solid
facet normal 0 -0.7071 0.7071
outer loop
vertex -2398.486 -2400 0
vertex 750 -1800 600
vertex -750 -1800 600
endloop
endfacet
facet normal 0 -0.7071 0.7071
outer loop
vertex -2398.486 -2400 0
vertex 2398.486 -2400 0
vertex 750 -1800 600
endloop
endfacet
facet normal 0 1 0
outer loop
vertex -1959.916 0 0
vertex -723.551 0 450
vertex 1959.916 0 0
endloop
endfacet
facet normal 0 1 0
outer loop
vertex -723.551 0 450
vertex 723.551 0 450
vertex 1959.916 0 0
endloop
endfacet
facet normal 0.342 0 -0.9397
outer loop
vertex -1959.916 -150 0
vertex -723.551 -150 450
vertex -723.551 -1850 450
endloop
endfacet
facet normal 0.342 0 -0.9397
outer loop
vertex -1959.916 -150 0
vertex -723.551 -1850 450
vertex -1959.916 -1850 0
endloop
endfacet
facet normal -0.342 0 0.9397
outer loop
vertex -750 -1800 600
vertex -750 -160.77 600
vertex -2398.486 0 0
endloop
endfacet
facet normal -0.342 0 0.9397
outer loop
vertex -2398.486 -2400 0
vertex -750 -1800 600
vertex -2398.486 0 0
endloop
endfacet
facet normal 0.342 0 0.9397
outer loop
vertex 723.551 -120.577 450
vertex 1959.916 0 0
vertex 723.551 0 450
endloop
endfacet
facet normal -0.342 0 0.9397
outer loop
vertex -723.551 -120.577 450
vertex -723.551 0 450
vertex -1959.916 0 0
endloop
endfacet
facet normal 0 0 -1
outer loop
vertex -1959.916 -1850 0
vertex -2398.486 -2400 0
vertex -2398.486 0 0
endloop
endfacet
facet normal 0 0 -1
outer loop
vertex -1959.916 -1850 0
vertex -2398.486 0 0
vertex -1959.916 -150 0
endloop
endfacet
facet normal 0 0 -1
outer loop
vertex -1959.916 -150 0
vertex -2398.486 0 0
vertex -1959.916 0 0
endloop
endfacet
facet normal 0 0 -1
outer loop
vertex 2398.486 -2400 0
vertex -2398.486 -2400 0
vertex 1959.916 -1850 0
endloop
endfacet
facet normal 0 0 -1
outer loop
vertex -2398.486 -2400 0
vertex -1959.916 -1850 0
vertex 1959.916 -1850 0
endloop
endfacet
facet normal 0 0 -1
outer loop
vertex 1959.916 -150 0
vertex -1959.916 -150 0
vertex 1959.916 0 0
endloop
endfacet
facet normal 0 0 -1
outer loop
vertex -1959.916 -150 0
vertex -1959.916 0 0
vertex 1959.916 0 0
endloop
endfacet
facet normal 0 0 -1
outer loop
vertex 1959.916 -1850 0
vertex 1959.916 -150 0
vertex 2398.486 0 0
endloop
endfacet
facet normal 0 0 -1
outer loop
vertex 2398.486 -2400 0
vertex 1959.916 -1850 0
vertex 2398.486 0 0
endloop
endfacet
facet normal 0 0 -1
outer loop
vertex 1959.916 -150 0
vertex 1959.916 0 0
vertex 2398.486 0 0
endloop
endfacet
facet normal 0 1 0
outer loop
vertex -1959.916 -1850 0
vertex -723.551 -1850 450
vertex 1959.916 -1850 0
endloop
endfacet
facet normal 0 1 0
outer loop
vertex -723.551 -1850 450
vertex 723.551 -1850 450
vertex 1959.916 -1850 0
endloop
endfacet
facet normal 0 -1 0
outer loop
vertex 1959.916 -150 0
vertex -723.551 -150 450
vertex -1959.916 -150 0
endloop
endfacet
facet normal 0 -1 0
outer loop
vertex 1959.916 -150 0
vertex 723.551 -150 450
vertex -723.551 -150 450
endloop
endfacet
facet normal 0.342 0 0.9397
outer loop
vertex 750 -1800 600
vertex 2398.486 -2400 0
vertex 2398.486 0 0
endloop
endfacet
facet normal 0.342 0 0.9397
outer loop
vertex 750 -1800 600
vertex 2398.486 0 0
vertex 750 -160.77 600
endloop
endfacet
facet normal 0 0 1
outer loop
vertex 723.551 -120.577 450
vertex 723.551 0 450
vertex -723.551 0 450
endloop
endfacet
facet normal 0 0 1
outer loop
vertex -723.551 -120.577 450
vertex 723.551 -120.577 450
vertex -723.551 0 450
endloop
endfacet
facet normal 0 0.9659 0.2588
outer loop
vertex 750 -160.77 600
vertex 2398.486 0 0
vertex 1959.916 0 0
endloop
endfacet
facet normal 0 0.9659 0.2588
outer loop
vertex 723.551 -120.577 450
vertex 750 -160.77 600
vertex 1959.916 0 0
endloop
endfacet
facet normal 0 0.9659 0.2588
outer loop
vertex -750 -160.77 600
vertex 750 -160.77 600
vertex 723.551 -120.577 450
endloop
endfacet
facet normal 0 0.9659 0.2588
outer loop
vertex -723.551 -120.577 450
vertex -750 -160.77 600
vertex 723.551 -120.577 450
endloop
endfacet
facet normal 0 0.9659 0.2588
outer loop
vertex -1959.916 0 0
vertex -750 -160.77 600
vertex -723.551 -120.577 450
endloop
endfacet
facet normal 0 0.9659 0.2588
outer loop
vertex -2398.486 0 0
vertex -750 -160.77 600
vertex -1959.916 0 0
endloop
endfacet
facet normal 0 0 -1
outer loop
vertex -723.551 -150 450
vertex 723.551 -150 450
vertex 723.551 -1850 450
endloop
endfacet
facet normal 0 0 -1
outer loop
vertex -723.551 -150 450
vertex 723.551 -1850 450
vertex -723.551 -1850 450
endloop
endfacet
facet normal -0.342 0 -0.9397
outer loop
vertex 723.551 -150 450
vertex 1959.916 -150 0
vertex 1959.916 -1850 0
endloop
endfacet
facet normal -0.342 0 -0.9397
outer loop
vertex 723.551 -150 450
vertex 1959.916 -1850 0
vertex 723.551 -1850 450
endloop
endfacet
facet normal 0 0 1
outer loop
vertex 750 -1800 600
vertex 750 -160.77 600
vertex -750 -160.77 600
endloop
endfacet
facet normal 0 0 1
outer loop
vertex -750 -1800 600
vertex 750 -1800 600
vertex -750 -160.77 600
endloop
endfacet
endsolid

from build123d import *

# Parameters (mm, degrees)
F1_DEPTH      = 2400
F3_DEPTH      = 2398.4874516728
F3_DEPTH_BACK = 2398.4874516728
F4_DEPTH      = 25
F4_DEPTH_BACK = 1850
F5_DEPTH      = 150


with BuildPart() as f1:
    # F0 (on Front) → F1 (new body)
    with BuildSketch(Plane.XZ):
        Polygon((-723.5509528937, 450), (-1959.9157916483, 0), (1959.9157916483, 0), (723.5509528937, 450), align=None)
        Polygon((-750, 600), (-2398.4864516728, 0), (-1959.9157916483, 0), (-723.5509528937, 450), (723.5509528937, 450), (1959.9157916483, 0), (2398.4864516728, 0), (1574.2432258364, 300), (750, 600), align=None)
    extrude(amount=F1_DEPTH)

    # F2 (on Right) → F3 (cut, two sides)
    with BuildSketch(Plane.YZ) as f3_sk:
        Polygon((-2400, 600), (-2400, 0), (-1800, 600), align=None)
        Polygon((-160.7695154587, 600), (0, 0), (0, 600), align=None)
    extrude(amount=F3_DEPTH, mode=Mode.SUBTRACT)
    extrude(f3_sk.sketch, amount=-F3_DEPTH_BACK, mode=Mode.SUBTRACT)

    # F0 (on Front) → F4 (cut, two sides)
    with BuildSketch(Plane.XZ) as f4_sk:
        Polygon((-723.5509528937, 450), (-1959.9157916483, 0), (1959.9157916483, 0), (723.5509528937, 450), align=None)
    extrude(amount=-F4_DEPTH, mode=Mode.SUBTRACT)
    extrude(f4_sk.sketch, amount=F4_DEPTH_BACK, mode=Mode.SUBTRACT)

    # F0 (on Front) → F5 (join)
    with BuildSketch(Plane.XZ):
        Polygon((-723.5509528937, 450), (-1959.9157916483, 0), (1959.9157916483, 0), (723.5509528937, 450), align=None)
    extrude(amount=F5_DEPTH)


solid = f1.part
